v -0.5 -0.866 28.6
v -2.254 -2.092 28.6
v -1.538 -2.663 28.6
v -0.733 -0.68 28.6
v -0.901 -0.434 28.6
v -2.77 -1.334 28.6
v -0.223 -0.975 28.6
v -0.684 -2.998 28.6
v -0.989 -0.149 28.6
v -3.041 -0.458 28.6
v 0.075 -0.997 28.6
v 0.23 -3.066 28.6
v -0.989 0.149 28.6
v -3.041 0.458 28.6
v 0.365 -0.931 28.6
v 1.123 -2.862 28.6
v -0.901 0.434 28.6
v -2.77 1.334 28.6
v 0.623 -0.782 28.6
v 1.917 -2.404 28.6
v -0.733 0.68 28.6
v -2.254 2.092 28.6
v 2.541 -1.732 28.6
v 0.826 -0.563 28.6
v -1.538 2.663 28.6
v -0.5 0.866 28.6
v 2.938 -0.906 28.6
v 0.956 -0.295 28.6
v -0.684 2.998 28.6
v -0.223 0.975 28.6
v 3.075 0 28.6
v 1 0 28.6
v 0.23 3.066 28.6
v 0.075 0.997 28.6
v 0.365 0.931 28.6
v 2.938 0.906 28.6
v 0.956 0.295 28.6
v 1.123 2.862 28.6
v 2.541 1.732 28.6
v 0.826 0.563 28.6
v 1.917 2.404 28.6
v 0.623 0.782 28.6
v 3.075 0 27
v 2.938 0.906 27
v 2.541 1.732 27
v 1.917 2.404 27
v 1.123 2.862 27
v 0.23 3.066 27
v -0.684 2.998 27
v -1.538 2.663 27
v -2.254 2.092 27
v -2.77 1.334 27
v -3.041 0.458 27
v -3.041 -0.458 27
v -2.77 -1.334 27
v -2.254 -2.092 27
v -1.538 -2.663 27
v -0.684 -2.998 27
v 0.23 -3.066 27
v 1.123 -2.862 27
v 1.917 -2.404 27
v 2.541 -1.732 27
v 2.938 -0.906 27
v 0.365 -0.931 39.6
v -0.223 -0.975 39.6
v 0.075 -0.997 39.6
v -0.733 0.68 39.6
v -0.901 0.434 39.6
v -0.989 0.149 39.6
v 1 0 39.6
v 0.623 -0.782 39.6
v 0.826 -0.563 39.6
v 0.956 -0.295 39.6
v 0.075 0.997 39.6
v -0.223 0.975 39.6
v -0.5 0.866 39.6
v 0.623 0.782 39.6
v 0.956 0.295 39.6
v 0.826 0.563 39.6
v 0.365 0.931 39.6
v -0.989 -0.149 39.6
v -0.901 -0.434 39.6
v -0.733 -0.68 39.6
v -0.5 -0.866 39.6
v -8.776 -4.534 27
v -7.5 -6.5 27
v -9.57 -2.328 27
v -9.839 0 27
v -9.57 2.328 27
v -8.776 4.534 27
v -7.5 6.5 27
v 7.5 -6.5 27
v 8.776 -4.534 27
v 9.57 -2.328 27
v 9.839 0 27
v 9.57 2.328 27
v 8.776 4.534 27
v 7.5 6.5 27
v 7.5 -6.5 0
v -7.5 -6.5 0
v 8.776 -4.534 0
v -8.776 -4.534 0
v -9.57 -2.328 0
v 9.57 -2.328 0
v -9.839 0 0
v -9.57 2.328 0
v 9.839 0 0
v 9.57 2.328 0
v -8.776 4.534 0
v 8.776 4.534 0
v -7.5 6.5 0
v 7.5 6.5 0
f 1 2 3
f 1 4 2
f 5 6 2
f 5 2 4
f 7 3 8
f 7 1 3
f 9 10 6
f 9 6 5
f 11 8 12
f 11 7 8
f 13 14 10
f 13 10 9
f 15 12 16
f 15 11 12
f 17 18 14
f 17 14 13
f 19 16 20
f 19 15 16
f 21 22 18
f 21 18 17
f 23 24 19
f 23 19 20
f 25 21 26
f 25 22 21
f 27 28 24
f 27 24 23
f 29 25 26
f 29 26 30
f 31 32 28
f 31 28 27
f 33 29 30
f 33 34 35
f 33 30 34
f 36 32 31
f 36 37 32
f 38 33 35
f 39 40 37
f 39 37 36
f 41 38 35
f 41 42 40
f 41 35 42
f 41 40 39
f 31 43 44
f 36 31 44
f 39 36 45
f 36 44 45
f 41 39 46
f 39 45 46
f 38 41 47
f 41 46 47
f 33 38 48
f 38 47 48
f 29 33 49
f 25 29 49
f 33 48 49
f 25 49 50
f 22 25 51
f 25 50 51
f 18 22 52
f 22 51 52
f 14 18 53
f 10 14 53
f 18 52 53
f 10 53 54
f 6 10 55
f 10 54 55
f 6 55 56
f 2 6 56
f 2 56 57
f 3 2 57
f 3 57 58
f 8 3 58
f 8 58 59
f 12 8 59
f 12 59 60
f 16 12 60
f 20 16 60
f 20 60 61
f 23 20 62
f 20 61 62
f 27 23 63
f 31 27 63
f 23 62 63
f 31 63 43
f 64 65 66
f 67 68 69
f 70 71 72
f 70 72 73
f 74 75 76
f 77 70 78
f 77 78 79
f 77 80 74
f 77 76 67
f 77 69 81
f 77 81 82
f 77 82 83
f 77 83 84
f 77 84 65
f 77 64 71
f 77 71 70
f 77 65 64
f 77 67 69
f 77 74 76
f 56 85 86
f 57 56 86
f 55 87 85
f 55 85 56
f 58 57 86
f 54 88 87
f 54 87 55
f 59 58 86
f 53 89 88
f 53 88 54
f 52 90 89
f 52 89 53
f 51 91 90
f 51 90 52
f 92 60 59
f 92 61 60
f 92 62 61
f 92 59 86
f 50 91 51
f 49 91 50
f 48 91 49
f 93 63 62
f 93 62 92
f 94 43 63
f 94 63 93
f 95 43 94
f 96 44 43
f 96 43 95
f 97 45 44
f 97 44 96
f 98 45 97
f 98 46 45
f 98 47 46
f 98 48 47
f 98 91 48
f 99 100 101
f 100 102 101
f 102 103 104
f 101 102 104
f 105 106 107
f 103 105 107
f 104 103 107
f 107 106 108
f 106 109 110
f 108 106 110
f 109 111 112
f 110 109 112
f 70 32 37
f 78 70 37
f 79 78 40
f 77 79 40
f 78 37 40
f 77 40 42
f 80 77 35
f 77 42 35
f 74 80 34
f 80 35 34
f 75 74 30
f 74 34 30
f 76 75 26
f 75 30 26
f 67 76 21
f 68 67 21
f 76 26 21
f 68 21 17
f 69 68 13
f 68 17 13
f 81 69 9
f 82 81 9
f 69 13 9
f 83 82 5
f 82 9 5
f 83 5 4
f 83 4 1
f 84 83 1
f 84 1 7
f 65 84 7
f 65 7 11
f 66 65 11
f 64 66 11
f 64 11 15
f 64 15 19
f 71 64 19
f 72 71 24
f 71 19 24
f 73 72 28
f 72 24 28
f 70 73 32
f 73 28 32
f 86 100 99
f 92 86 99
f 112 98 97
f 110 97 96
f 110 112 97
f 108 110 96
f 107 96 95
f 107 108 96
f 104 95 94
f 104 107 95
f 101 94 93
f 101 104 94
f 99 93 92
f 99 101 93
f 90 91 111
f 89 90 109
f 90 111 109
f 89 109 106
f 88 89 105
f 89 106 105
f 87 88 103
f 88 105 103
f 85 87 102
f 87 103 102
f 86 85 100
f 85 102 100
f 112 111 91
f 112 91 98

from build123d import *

# Parameters (mm, degrees)
SKETCH1_W           = 15
SKETCH1_H           = 13
BOSS_EXTRUDE1_DEPTH = 27
SKETCH2_R           = 3.075
BOSS_EXTRUDE2_DEPTH = 1.6
SKETCH3_R           = 1
BOSS_EXTRUDE3_DEPTH = 11


with BuildPart() as part:
    # Sketch1 → Boss-Extrude1 (new body)
    with BuildSketch(Plane.XY):
        Rectangle(SKETCH1_W, SKETCH1_H)
        with BuildLine():
            ThreePointArc((7.5, 6.5), (9.83933845, 0), (7.5, -6.5))
            Line((7.5, -6.5), (7.5, 6.5))
        make_face()
        with BuildLine():
            Line((-7.5, -6.5), (-7.5, 6.5))
            ThreePointArc((-7.5, 6.5), (-9.83933845, 0), (-7.5, -6.5))
        make_face()
    extrude(amount=BOSS_EXTRUDE1_DEPTH)

    # Sketch2 → Boss-Extrude2 (add)
    with BuildSketch(Plane.XY.offset(27)):
        Circle(SKETCH2_R)
    extrude(amount=BOSS_EXTRUDE2_DEPTH)

    # Sketch3 → Boss-Extrude3 (add)
    with BuildSketch(Plane.XY.offset(28.6)):
        Circle(SKETCH3_R)
    extrude(amount=BOSS_EXTRUDE3_DEPTH)


solid = part.part
